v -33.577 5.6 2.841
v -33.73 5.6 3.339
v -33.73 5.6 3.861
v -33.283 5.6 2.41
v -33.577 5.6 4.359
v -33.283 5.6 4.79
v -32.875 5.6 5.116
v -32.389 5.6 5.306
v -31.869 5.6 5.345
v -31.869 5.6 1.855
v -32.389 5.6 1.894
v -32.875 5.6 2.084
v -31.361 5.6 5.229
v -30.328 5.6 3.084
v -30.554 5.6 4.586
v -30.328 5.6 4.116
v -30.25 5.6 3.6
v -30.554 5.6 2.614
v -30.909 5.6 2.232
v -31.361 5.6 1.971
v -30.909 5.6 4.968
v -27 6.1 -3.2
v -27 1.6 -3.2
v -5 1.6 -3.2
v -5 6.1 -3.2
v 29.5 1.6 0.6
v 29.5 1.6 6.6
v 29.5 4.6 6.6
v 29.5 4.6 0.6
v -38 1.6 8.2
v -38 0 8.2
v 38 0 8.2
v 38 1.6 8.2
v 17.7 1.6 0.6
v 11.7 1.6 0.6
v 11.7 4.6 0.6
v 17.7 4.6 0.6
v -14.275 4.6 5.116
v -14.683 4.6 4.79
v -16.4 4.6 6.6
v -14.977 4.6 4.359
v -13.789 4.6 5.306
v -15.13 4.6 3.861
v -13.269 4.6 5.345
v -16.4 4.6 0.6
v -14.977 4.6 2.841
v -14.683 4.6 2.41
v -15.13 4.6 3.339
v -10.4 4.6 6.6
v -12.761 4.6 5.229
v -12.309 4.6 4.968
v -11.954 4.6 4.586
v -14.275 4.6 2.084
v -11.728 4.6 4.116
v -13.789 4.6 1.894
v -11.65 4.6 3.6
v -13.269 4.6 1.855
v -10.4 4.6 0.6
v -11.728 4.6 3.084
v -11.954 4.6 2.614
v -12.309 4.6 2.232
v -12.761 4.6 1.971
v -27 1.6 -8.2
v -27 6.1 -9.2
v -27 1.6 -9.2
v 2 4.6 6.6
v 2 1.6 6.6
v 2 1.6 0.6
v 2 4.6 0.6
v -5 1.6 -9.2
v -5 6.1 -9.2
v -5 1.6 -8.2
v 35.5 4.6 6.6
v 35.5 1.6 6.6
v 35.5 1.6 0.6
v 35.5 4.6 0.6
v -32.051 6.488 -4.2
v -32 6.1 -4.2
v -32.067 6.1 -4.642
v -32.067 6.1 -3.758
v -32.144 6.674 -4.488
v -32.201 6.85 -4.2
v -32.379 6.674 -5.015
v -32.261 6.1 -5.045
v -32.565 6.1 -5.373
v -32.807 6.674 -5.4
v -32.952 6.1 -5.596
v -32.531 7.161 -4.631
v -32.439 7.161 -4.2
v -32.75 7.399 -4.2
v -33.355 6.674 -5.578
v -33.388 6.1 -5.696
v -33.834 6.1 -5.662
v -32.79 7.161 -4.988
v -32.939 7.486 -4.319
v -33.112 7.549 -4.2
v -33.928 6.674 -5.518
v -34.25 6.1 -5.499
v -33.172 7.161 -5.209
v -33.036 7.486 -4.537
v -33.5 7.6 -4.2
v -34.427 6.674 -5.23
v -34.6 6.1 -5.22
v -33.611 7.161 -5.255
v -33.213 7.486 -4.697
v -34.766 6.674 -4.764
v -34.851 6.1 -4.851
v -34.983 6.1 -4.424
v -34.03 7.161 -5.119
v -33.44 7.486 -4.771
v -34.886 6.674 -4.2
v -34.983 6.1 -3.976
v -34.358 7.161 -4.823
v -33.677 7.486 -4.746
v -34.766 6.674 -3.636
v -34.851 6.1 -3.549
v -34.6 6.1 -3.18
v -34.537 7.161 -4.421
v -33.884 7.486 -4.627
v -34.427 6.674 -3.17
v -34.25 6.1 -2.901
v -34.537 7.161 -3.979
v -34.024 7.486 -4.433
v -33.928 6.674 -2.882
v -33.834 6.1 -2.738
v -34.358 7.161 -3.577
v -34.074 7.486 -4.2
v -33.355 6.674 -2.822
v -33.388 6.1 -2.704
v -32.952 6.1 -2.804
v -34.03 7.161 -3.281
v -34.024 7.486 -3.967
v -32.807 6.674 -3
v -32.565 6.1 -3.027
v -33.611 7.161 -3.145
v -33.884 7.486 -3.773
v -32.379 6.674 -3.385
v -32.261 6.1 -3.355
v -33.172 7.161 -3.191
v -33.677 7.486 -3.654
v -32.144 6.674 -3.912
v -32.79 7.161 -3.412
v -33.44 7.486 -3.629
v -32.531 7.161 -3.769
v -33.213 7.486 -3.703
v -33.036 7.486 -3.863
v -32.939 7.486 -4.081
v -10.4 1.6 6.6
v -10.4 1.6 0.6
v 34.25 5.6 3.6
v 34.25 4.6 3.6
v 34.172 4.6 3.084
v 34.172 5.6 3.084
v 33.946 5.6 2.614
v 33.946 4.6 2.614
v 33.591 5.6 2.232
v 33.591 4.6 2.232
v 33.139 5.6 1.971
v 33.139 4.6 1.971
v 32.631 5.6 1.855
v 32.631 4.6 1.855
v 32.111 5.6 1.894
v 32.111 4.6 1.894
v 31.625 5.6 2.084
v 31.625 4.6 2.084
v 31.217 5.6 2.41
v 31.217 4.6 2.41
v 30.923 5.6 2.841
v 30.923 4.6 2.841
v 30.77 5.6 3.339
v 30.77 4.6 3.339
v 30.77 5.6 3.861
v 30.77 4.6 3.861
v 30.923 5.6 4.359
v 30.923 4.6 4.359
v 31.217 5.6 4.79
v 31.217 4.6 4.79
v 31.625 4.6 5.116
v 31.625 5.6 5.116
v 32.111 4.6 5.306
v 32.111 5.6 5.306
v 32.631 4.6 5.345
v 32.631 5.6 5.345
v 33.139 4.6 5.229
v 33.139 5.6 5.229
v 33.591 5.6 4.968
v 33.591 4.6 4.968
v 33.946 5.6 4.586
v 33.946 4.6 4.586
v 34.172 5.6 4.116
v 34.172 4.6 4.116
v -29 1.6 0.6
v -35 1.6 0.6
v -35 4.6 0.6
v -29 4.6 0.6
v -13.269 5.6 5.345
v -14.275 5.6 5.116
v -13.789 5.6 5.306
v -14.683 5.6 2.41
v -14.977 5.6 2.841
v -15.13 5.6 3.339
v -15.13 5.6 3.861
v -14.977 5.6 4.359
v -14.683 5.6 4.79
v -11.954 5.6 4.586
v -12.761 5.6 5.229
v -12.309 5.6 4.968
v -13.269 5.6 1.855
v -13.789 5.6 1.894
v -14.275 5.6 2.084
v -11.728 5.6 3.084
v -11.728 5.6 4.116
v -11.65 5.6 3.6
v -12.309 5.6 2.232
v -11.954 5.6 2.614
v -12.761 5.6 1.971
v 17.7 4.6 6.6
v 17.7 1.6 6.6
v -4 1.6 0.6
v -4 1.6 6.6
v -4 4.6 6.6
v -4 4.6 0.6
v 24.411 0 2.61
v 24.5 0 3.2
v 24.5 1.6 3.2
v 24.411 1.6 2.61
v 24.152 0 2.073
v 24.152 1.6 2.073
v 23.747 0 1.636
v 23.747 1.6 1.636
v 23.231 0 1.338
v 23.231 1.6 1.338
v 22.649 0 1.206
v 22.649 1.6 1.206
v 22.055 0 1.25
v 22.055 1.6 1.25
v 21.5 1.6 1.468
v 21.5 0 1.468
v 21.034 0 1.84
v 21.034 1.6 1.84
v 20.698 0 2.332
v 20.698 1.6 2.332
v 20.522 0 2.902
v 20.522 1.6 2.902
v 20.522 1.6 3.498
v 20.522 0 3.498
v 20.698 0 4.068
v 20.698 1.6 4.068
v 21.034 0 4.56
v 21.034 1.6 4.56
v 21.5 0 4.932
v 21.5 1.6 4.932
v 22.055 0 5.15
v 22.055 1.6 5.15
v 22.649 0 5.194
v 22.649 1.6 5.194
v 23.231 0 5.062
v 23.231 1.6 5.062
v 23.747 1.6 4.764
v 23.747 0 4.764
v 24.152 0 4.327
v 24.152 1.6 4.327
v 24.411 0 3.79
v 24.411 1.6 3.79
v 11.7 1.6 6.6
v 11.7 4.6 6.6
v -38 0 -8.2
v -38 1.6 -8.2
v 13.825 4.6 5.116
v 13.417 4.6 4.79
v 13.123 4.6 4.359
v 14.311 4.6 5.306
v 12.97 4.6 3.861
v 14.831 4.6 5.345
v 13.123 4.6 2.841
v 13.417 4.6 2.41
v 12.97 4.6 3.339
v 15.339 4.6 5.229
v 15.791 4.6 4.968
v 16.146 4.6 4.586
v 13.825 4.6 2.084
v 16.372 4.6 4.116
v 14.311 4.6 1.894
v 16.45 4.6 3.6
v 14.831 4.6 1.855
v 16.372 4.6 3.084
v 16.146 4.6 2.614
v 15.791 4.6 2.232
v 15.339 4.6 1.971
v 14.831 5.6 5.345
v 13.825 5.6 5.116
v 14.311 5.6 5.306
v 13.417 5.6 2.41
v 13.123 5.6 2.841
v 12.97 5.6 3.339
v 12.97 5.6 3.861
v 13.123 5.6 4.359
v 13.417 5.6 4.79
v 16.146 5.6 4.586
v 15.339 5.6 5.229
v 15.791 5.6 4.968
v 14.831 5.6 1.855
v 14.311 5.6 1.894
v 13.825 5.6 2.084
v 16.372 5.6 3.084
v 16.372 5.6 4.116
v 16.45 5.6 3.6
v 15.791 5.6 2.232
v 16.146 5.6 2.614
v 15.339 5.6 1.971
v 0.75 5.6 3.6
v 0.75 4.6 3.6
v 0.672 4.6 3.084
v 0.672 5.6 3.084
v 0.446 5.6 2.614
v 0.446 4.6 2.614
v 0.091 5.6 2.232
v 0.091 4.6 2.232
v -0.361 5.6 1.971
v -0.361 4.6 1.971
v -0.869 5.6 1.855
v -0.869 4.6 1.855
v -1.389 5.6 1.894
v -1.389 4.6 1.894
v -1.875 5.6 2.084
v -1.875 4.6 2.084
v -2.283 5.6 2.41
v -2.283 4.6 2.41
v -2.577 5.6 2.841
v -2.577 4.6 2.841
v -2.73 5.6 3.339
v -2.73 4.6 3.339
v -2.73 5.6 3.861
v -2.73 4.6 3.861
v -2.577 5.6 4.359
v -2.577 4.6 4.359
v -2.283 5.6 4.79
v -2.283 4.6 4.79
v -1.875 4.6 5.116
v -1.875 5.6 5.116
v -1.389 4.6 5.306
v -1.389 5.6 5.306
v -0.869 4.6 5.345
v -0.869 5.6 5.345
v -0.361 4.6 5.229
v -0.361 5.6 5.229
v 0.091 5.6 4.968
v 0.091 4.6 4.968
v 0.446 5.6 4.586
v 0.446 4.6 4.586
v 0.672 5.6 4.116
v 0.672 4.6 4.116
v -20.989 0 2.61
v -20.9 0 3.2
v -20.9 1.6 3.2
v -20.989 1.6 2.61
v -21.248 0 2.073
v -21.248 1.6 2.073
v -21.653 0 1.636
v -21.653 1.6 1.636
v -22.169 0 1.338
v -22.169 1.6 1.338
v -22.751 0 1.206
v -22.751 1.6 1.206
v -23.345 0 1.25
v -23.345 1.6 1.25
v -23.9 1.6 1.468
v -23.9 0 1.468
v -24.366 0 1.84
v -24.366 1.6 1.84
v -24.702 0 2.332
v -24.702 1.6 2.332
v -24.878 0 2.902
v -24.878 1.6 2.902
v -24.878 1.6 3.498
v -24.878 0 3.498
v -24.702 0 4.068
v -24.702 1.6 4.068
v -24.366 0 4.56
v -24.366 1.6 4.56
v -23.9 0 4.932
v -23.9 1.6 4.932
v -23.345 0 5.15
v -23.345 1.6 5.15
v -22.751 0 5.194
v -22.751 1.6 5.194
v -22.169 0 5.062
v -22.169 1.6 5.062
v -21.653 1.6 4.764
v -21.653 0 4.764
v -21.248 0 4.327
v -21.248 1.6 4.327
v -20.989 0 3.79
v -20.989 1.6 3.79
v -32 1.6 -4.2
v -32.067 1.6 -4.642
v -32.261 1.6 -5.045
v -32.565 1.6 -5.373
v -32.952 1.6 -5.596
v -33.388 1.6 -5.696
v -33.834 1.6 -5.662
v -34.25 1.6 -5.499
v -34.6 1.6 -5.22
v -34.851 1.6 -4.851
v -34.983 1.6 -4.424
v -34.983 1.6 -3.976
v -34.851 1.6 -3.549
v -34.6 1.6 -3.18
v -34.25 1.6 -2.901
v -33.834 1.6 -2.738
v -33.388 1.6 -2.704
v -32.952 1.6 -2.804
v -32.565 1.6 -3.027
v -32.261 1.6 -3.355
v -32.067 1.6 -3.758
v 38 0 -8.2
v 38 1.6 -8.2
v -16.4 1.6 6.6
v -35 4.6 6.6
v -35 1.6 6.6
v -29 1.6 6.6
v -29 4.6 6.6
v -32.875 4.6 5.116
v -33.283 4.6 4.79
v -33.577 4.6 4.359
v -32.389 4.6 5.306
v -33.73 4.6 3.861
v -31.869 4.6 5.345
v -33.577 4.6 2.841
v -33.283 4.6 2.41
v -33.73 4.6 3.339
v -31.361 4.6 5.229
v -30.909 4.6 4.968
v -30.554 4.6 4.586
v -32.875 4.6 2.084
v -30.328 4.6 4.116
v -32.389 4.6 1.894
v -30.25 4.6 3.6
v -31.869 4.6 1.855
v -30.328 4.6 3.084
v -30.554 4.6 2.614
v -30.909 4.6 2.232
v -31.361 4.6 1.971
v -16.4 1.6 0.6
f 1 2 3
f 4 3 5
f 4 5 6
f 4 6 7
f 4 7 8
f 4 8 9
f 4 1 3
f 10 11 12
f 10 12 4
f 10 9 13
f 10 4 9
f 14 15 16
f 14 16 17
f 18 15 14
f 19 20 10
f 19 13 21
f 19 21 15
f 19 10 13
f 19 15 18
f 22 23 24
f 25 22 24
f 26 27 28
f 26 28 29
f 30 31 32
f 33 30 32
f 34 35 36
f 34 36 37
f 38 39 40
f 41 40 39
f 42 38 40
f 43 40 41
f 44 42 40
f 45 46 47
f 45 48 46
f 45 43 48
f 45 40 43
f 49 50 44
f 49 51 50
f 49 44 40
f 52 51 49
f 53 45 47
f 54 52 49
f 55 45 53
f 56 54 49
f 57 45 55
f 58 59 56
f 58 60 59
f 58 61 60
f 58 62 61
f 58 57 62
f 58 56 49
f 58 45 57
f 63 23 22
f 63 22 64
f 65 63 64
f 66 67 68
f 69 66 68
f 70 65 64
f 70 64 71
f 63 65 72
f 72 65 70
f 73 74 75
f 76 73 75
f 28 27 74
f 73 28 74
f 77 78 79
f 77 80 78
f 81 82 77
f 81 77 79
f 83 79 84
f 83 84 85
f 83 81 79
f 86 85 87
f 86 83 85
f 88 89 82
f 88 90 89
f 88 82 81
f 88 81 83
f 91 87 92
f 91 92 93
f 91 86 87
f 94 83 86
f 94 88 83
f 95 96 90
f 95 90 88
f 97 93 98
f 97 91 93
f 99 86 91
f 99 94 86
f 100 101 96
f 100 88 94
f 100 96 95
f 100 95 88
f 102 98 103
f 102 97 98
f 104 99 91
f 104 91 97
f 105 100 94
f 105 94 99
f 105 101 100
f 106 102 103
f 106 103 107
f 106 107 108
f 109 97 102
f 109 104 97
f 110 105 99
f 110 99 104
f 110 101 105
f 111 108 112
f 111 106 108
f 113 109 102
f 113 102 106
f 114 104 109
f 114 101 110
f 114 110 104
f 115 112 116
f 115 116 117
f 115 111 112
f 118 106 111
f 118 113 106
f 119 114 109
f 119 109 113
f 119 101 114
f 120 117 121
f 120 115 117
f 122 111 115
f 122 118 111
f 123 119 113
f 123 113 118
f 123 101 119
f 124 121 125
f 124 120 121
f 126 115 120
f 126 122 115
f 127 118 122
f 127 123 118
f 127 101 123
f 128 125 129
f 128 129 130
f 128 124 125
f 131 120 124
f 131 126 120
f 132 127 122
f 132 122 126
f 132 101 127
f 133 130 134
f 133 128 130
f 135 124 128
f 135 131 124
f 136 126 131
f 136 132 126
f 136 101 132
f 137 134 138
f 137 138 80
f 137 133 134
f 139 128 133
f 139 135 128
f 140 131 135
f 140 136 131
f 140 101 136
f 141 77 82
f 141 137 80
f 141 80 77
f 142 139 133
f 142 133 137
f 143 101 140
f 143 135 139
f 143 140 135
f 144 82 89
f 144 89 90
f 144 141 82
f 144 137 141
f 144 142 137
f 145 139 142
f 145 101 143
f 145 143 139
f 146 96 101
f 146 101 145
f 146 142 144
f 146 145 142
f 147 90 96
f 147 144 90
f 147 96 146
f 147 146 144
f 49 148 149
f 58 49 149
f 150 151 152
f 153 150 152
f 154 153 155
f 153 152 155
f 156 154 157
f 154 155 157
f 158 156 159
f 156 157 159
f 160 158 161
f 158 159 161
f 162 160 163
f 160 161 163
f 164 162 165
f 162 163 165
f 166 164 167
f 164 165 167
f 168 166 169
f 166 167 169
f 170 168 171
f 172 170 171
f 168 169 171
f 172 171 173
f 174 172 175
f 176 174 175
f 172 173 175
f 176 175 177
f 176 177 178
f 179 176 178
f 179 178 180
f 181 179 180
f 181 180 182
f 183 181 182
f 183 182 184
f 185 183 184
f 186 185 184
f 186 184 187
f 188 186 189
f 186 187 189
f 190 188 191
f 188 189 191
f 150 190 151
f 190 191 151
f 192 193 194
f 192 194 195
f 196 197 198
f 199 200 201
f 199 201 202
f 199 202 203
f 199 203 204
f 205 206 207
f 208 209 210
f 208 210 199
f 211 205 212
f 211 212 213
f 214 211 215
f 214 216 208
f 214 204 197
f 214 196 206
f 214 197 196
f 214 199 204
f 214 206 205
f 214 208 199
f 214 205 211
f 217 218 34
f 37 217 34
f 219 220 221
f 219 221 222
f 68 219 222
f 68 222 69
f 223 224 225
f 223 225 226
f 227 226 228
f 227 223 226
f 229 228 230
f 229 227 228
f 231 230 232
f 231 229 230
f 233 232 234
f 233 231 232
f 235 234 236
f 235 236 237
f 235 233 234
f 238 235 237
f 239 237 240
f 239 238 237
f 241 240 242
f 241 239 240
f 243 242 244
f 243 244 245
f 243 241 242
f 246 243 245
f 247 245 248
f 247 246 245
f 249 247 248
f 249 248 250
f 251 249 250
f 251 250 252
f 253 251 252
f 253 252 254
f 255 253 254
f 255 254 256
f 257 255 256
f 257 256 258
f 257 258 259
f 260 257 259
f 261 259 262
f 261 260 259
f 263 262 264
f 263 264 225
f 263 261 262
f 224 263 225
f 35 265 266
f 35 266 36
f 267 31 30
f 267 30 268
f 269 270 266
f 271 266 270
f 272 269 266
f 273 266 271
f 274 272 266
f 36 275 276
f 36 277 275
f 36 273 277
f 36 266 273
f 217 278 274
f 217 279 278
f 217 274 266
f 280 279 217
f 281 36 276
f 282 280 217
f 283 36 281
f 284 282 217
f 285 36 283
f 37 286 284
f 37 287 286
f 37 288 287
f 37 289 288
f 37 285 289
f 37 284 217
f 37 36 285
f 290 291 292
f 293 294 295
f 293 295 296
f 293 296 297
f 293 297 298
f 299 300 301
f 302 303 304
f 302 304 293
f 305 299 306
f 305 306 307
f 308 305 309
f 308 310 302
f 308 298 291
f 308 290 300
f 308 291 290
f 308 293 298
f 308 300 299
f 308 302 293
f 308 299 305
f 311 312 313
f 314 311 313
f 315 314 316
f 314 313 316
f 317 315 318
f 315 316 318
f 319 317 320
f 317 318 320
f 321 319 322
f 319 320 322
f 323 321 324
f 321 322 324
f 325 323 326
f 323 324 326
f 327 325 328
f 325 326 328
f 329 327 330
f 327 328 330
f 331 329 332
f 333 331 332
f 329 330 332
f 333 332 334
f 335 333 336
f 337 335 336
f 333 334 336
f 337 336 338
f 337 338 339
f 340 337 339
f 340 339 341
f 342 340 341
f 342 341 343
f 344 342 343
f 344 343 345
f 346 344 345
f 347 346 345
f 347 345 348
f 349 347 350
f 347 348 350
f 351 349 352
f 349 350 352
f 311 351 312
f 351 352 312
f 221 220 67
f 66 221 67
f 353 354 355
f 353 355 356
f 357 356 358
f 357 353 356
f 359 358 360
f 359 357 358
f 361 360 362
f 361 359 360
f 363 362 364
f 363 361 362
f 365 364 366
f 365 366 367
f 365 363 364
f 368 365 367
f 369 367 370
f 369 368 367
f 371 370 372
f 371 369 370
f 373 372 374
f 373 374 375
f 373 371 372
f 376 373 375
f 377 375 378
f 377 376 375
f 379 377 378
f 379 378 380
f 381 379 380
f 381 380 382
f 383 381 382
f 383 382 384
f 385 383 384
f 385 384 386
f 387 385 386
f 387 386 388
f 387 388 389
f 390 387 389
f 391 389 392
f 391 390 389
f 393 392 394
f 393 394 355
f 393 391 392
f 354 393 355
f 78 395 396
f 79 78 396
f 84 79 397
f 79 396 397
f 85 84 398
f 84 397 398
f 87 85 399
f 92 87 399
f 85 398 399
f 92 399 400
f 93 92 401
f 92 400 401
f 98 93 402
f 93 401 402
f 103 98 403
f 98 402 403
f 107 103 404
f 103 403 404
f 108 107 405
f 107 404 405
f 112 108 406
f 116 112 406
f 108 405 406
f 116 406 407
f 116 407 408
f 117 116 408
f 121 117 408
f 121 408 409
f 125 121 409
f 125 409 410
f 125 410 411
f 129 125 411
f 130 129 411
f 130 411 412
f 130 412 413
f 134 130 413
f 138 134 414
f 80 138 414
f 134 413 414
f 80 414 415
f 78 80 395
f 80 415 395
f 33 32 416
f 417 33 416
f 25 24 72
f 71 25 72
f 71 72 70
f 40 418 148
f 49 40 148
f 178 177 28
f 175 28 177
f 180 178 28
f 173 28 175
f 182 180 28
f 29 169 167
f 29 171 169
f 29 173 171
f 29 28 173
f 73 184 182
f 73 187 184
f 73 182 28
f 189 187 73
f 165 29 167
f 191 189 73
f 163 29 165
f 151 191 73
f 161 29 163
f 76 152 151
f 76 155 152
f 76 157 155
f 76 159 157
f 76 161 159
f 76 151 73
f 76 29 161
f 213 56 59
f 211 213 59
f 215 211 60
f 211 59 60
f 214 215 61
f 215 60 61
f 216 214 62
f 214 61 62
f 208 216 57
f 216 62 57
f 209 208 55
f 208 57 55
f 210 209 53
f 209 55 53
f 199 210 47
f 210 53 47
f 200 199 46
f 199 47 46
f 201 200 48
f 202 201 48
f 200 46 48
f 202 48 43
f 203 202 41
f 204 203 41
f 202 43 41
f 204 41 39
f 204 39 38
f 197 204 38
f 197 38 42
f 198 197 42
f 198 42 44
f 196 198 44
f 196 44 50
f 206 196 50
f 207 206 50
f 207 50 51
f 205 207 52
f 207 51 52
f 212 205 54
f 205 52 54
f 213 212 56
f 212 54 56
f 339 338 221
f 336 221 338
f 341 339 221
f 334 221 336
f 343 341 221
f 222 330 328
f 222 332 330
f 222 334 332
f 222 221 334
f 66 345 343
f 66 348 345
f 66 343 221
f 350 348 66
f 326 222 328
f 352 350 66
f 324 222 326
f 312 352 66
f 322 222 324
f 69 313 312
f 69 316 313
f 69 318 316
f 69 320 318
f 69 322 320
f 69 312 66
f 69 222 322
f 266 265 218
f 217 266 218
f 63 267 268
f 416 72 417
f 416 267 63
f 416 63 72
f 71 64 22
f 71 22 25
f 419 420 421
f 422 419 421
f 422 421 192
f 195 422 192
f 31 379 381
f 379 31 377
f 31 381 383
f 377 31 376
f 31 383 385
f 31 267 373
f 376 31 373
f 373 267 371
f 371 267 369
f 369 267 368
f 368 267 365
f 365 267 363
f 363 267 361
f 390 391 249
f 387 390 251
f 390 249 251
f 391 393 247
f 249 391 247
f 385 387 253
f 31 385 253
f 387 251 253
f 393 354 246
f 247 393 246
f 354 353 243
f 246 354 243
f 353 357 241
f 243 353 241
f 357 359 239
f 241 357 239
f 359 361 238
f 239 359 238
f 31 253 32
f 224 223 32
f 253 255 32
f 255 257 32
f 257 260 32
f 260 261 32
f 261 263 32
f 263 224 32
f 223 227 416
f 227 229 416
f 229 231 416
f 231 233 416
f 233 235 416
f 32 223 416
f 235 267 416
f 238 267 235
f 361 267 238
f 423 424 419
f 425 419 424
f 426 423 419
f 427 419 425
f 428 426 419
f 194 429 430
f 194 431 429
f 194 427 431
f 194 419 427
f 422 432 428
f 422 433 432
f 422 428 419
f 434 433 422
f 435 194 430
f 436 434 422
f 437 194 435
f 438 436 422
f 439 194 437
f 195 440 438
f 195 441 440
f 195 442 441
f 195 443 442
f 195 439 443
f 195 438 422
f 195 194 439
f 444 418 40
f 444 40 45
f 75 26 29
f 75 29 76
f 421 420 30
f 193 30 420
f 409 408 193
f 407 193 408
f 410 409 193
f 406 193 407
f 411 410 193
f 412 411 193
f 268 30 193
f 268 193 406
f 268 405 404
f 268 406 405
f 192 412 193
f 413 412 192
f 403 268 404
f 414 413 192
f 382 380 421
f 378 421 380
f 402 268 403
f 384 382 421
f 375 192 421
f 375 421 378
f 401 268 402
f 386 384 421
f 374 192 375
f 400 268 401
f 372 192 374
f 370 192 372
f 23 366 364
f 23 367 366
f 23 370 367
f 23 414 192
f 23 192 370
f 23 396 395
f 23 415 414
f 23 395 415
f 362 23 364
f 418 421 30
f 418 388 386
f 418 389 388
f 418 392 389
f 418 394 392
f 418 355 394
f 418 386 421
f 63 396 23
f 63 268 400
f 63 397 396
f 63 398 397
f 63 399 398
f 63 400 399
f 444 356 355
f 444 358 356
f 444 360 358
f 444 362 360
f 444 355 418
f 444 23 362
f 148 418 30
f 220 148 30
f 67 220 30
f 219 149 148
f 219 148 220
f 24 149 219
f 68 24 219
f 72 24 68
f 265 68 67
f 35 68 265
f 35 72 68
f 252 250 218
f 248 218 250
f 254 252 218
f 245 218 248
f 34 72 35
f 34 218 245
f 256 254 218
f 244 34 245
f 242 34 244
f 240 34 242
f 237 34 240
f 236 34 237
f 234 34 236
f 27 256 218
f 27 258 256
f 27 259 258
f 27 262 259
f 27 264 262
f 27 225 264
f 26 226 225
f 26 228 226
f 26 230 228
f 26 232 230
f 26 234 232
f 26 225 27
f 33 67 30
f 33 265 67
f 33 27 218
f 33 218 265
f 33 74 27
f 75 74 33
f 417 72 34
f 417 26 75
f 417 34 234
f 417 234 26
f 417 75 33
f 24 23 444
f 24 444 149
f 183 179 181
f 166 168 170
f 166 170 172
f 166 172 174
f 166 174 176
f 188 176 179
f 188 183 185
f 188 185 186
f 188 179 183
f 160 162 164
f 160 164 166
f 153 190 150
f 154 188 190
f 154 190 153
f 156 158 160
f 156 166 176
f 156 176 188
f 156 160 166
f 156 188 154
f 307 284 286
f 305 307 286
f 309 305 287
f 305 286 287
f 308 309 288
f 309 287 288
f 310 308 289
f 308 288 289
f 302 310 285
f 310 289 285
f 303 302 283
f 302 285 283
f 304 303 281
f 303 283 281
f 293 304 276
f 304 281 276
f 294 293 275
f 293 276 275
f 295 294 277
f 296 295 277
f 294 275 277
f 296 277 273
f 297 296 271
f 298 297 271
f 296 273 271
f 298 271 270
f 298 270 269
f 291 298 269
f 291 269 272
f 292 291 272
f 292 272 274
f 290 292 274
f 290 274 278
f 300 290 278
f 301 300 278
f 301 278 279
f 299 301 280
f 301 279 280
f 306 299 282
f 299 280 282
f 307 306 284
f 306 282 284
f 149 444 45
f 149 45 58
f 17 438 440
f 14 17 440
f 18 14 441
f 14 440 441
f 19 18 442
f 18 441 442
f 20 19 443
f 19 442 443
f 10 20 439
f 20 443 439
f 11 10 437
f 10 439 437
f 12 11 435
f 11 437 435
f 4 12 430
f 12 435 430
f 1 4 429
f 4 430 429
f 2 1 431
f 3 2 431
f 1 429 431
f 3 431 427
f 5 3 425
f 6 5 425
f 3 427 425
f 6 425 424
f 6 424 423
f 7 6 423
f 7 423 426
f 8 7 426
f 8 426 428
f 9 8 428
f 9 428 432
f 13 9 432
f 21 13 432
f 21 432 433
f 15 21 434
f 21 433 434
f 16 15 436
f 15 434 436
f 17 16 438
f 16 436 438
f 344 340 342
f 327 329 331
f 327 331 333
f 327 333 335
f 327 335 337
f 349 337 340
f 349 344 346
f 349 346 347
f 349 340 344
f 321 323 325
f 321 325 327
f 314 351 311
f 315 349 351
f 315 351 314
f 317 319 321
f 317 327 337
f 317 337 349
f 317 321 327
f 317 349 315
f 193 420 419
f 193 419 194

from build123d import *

# Parameters (mm, degrees)
SZKIC1_W                    = 76
SZKIC1_H                    = 16.4
SZKIC1_R                    = 2
DODANIE_WYCI_GNI_CIE1_DEPTH = 1.6
SZKIC2_W                    = 6
SZKIC2_H                    = 6
DODANIE_WYCI_GNI_CIE2_DEPTH = 3
SZKIC3_R                    = 1.75
DODANIE_WYCI_GNI_CIE3_DEPTH = 1
SZKIC4_R                    = 1.5
DODANIE_WYCI_GNI_CIE4_DEPTH = 6
ZAOKR_GLENIE1_R             = 1.5
SZKIC5_W                    = 22
SZKIC5_H                    = 6
DODANIE_WYCI_GNI_CIE5_DEPTH = 4.5


with BuildPart() as part:
    # Szkic1 → Dodanie-wyciągnięcie1 (new body)
    with BuildSketch(Plane(origin=(0, 0, 0), x_dir=(1, 0, 0), z_dir=(0, 1, 0))):
        Rectangle(SZKIC1_W, SZKIC1_H)
        with Locations((-22.9, -3.2)):
            Circle(SZKIC1_R, mode=Mode.SUBTRACT)
        with Locations((22.5, -3.2)):
            Circle(SZKIC1_R, mode=Mode.SUBTRACT)
    extrude(amount=DODANIE_WYCI_GNI_CIE1_DEPTH)

    # Szkic2 → Dodanie-wyciągnięcie2 (add)
    with BuildSketch(Plane(origin=(0, 1.6, 0), x_dir=(1, 0, 0), z_dir=(0, 1, 0))):
        with Locations((-32, -3.6)):
            Rectangle(SZKIC2_W, SZKIC2_H)
        with Locations((-13.4, -3.6)):
            Rectangle(SZKIC2_W, SZKIC2_H)
        with Locations((-1, -3.6)):
            Rectangle(SZKIC2_W, SZKIC2_H)
        with Locations((14.7, -3.6)):
            Rectangle(SZKIC2_W, SZKIC2_H)
        with Locations((32.5, -3.6)):
            Rectangle(SZKIC2_W, SZKIC2_H)
    extrude(amount=DODANIE_WYCI_GNI_CIE2_DEPTH)

    # Szkic3 → Dodanie-wyciągnięcie3 (add)
    with BuildSketch(Plane(origin=(0, 4.6, 0), x_dir=(1, 0, 0), z_dir=(0, 1, 0))):
        with Locations((-32, -3.6)):
            Circle(SZKIC3_R)
        with Locations((-13.4, -3.6)):
            Circle(SZKIC3_R)
        with Locations((-1, -3.6)):
            Circle(SZKIC3_R)
        with Locations((14.7, -3.6)):
            Circle(SZKIC3_R)
        with Locations((32.5, -3.6)):
            Circle(SZKIC3_R)
    extrude(amount=DODANIE_WYCI_GNI_CIE3_DEPTH)

    # Szkic4 → Dodanie-wyciągnięcie4 (add)
    with BuildSketch(Plane(origin=(0, 1.6, 0), x_dir=(1, 0, 0), z_dir=(0, 1, 0))):
        with Locations((-33.5, 4.2)):
            Circle(SZKIC4_R)
    extrude(amount=DODANIE_WYCI_GNI_CIE4_DEPTH)

    # Zaokrąglenie1
    zaokr_glenie1_edges = [part.edges().sort_by_distance(p)[0] for p in [
        (-35, 7.6, -4.2),
    ]]
    fillet(zaokr_glenie1_edges, radius=ZAOKR_GLENIE1_R)

    # Szkic5 → Dodanie-wyciągnięcie5 (add)
    with BuildSketch(Plane(origin=(0, 1.6, 0), x_dir=(1, 0, 0), z_dir=(0, 1, 0))):
        with Locations((-16, 6.2)):
            Rectangle(SZKIC5_W, SZKIC5_H)
    extrude(amount=DODANIE_WYCI_GNI_CIE5_DEPTH)


solid = part.part
